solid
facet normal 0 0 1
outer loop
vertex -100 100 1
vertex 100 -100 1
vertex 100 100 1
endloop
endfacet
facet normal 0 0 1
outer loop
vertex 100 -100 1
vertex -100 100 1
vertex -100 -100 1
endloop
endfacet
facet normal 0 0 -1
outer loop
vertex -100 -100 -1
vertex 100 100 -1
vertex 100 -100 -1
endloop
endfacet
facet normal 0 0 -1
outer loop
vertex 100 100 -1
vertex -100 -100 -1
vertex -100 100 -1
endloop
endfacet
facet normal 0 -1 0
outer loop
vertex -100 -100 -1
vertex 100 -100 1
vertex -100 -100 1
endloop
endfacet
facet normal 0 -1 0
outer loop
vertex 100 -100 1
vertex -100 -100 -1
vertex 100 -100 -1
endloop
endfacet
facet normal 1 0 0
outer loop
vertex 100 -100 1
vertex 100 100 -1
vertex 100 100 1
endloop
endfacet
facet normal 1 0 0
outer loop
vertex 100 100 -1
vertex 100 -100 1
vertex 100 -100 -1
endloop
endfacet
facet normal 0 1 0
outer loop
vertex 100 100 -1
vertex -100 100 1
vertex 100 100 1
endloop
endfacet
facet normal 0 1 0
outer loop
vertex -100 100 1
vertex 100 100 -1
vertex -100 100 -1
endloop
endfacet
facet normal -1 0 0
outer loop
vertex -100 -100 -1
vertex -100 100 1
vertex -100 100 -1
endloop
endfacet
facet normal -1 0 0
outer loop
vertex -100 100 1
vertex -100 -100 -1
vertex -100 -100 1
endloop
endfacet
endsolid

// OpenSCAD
// Parameters
sheet_length = 200; //[100:400:1]
sheet_width = 200; //[100:400:1]
sheet_thickness = 2; //[1:4:0.5]

// Geometry
module sheet_body() {
  color([0.85, 0.85, 0.8]) // Off-white for 3D printed PLA
  translate([0, 0, 0])
    cube([sheet_length, sheet_width, sheet_thickness], center=true);
}

// Final Output
sheet_body();
